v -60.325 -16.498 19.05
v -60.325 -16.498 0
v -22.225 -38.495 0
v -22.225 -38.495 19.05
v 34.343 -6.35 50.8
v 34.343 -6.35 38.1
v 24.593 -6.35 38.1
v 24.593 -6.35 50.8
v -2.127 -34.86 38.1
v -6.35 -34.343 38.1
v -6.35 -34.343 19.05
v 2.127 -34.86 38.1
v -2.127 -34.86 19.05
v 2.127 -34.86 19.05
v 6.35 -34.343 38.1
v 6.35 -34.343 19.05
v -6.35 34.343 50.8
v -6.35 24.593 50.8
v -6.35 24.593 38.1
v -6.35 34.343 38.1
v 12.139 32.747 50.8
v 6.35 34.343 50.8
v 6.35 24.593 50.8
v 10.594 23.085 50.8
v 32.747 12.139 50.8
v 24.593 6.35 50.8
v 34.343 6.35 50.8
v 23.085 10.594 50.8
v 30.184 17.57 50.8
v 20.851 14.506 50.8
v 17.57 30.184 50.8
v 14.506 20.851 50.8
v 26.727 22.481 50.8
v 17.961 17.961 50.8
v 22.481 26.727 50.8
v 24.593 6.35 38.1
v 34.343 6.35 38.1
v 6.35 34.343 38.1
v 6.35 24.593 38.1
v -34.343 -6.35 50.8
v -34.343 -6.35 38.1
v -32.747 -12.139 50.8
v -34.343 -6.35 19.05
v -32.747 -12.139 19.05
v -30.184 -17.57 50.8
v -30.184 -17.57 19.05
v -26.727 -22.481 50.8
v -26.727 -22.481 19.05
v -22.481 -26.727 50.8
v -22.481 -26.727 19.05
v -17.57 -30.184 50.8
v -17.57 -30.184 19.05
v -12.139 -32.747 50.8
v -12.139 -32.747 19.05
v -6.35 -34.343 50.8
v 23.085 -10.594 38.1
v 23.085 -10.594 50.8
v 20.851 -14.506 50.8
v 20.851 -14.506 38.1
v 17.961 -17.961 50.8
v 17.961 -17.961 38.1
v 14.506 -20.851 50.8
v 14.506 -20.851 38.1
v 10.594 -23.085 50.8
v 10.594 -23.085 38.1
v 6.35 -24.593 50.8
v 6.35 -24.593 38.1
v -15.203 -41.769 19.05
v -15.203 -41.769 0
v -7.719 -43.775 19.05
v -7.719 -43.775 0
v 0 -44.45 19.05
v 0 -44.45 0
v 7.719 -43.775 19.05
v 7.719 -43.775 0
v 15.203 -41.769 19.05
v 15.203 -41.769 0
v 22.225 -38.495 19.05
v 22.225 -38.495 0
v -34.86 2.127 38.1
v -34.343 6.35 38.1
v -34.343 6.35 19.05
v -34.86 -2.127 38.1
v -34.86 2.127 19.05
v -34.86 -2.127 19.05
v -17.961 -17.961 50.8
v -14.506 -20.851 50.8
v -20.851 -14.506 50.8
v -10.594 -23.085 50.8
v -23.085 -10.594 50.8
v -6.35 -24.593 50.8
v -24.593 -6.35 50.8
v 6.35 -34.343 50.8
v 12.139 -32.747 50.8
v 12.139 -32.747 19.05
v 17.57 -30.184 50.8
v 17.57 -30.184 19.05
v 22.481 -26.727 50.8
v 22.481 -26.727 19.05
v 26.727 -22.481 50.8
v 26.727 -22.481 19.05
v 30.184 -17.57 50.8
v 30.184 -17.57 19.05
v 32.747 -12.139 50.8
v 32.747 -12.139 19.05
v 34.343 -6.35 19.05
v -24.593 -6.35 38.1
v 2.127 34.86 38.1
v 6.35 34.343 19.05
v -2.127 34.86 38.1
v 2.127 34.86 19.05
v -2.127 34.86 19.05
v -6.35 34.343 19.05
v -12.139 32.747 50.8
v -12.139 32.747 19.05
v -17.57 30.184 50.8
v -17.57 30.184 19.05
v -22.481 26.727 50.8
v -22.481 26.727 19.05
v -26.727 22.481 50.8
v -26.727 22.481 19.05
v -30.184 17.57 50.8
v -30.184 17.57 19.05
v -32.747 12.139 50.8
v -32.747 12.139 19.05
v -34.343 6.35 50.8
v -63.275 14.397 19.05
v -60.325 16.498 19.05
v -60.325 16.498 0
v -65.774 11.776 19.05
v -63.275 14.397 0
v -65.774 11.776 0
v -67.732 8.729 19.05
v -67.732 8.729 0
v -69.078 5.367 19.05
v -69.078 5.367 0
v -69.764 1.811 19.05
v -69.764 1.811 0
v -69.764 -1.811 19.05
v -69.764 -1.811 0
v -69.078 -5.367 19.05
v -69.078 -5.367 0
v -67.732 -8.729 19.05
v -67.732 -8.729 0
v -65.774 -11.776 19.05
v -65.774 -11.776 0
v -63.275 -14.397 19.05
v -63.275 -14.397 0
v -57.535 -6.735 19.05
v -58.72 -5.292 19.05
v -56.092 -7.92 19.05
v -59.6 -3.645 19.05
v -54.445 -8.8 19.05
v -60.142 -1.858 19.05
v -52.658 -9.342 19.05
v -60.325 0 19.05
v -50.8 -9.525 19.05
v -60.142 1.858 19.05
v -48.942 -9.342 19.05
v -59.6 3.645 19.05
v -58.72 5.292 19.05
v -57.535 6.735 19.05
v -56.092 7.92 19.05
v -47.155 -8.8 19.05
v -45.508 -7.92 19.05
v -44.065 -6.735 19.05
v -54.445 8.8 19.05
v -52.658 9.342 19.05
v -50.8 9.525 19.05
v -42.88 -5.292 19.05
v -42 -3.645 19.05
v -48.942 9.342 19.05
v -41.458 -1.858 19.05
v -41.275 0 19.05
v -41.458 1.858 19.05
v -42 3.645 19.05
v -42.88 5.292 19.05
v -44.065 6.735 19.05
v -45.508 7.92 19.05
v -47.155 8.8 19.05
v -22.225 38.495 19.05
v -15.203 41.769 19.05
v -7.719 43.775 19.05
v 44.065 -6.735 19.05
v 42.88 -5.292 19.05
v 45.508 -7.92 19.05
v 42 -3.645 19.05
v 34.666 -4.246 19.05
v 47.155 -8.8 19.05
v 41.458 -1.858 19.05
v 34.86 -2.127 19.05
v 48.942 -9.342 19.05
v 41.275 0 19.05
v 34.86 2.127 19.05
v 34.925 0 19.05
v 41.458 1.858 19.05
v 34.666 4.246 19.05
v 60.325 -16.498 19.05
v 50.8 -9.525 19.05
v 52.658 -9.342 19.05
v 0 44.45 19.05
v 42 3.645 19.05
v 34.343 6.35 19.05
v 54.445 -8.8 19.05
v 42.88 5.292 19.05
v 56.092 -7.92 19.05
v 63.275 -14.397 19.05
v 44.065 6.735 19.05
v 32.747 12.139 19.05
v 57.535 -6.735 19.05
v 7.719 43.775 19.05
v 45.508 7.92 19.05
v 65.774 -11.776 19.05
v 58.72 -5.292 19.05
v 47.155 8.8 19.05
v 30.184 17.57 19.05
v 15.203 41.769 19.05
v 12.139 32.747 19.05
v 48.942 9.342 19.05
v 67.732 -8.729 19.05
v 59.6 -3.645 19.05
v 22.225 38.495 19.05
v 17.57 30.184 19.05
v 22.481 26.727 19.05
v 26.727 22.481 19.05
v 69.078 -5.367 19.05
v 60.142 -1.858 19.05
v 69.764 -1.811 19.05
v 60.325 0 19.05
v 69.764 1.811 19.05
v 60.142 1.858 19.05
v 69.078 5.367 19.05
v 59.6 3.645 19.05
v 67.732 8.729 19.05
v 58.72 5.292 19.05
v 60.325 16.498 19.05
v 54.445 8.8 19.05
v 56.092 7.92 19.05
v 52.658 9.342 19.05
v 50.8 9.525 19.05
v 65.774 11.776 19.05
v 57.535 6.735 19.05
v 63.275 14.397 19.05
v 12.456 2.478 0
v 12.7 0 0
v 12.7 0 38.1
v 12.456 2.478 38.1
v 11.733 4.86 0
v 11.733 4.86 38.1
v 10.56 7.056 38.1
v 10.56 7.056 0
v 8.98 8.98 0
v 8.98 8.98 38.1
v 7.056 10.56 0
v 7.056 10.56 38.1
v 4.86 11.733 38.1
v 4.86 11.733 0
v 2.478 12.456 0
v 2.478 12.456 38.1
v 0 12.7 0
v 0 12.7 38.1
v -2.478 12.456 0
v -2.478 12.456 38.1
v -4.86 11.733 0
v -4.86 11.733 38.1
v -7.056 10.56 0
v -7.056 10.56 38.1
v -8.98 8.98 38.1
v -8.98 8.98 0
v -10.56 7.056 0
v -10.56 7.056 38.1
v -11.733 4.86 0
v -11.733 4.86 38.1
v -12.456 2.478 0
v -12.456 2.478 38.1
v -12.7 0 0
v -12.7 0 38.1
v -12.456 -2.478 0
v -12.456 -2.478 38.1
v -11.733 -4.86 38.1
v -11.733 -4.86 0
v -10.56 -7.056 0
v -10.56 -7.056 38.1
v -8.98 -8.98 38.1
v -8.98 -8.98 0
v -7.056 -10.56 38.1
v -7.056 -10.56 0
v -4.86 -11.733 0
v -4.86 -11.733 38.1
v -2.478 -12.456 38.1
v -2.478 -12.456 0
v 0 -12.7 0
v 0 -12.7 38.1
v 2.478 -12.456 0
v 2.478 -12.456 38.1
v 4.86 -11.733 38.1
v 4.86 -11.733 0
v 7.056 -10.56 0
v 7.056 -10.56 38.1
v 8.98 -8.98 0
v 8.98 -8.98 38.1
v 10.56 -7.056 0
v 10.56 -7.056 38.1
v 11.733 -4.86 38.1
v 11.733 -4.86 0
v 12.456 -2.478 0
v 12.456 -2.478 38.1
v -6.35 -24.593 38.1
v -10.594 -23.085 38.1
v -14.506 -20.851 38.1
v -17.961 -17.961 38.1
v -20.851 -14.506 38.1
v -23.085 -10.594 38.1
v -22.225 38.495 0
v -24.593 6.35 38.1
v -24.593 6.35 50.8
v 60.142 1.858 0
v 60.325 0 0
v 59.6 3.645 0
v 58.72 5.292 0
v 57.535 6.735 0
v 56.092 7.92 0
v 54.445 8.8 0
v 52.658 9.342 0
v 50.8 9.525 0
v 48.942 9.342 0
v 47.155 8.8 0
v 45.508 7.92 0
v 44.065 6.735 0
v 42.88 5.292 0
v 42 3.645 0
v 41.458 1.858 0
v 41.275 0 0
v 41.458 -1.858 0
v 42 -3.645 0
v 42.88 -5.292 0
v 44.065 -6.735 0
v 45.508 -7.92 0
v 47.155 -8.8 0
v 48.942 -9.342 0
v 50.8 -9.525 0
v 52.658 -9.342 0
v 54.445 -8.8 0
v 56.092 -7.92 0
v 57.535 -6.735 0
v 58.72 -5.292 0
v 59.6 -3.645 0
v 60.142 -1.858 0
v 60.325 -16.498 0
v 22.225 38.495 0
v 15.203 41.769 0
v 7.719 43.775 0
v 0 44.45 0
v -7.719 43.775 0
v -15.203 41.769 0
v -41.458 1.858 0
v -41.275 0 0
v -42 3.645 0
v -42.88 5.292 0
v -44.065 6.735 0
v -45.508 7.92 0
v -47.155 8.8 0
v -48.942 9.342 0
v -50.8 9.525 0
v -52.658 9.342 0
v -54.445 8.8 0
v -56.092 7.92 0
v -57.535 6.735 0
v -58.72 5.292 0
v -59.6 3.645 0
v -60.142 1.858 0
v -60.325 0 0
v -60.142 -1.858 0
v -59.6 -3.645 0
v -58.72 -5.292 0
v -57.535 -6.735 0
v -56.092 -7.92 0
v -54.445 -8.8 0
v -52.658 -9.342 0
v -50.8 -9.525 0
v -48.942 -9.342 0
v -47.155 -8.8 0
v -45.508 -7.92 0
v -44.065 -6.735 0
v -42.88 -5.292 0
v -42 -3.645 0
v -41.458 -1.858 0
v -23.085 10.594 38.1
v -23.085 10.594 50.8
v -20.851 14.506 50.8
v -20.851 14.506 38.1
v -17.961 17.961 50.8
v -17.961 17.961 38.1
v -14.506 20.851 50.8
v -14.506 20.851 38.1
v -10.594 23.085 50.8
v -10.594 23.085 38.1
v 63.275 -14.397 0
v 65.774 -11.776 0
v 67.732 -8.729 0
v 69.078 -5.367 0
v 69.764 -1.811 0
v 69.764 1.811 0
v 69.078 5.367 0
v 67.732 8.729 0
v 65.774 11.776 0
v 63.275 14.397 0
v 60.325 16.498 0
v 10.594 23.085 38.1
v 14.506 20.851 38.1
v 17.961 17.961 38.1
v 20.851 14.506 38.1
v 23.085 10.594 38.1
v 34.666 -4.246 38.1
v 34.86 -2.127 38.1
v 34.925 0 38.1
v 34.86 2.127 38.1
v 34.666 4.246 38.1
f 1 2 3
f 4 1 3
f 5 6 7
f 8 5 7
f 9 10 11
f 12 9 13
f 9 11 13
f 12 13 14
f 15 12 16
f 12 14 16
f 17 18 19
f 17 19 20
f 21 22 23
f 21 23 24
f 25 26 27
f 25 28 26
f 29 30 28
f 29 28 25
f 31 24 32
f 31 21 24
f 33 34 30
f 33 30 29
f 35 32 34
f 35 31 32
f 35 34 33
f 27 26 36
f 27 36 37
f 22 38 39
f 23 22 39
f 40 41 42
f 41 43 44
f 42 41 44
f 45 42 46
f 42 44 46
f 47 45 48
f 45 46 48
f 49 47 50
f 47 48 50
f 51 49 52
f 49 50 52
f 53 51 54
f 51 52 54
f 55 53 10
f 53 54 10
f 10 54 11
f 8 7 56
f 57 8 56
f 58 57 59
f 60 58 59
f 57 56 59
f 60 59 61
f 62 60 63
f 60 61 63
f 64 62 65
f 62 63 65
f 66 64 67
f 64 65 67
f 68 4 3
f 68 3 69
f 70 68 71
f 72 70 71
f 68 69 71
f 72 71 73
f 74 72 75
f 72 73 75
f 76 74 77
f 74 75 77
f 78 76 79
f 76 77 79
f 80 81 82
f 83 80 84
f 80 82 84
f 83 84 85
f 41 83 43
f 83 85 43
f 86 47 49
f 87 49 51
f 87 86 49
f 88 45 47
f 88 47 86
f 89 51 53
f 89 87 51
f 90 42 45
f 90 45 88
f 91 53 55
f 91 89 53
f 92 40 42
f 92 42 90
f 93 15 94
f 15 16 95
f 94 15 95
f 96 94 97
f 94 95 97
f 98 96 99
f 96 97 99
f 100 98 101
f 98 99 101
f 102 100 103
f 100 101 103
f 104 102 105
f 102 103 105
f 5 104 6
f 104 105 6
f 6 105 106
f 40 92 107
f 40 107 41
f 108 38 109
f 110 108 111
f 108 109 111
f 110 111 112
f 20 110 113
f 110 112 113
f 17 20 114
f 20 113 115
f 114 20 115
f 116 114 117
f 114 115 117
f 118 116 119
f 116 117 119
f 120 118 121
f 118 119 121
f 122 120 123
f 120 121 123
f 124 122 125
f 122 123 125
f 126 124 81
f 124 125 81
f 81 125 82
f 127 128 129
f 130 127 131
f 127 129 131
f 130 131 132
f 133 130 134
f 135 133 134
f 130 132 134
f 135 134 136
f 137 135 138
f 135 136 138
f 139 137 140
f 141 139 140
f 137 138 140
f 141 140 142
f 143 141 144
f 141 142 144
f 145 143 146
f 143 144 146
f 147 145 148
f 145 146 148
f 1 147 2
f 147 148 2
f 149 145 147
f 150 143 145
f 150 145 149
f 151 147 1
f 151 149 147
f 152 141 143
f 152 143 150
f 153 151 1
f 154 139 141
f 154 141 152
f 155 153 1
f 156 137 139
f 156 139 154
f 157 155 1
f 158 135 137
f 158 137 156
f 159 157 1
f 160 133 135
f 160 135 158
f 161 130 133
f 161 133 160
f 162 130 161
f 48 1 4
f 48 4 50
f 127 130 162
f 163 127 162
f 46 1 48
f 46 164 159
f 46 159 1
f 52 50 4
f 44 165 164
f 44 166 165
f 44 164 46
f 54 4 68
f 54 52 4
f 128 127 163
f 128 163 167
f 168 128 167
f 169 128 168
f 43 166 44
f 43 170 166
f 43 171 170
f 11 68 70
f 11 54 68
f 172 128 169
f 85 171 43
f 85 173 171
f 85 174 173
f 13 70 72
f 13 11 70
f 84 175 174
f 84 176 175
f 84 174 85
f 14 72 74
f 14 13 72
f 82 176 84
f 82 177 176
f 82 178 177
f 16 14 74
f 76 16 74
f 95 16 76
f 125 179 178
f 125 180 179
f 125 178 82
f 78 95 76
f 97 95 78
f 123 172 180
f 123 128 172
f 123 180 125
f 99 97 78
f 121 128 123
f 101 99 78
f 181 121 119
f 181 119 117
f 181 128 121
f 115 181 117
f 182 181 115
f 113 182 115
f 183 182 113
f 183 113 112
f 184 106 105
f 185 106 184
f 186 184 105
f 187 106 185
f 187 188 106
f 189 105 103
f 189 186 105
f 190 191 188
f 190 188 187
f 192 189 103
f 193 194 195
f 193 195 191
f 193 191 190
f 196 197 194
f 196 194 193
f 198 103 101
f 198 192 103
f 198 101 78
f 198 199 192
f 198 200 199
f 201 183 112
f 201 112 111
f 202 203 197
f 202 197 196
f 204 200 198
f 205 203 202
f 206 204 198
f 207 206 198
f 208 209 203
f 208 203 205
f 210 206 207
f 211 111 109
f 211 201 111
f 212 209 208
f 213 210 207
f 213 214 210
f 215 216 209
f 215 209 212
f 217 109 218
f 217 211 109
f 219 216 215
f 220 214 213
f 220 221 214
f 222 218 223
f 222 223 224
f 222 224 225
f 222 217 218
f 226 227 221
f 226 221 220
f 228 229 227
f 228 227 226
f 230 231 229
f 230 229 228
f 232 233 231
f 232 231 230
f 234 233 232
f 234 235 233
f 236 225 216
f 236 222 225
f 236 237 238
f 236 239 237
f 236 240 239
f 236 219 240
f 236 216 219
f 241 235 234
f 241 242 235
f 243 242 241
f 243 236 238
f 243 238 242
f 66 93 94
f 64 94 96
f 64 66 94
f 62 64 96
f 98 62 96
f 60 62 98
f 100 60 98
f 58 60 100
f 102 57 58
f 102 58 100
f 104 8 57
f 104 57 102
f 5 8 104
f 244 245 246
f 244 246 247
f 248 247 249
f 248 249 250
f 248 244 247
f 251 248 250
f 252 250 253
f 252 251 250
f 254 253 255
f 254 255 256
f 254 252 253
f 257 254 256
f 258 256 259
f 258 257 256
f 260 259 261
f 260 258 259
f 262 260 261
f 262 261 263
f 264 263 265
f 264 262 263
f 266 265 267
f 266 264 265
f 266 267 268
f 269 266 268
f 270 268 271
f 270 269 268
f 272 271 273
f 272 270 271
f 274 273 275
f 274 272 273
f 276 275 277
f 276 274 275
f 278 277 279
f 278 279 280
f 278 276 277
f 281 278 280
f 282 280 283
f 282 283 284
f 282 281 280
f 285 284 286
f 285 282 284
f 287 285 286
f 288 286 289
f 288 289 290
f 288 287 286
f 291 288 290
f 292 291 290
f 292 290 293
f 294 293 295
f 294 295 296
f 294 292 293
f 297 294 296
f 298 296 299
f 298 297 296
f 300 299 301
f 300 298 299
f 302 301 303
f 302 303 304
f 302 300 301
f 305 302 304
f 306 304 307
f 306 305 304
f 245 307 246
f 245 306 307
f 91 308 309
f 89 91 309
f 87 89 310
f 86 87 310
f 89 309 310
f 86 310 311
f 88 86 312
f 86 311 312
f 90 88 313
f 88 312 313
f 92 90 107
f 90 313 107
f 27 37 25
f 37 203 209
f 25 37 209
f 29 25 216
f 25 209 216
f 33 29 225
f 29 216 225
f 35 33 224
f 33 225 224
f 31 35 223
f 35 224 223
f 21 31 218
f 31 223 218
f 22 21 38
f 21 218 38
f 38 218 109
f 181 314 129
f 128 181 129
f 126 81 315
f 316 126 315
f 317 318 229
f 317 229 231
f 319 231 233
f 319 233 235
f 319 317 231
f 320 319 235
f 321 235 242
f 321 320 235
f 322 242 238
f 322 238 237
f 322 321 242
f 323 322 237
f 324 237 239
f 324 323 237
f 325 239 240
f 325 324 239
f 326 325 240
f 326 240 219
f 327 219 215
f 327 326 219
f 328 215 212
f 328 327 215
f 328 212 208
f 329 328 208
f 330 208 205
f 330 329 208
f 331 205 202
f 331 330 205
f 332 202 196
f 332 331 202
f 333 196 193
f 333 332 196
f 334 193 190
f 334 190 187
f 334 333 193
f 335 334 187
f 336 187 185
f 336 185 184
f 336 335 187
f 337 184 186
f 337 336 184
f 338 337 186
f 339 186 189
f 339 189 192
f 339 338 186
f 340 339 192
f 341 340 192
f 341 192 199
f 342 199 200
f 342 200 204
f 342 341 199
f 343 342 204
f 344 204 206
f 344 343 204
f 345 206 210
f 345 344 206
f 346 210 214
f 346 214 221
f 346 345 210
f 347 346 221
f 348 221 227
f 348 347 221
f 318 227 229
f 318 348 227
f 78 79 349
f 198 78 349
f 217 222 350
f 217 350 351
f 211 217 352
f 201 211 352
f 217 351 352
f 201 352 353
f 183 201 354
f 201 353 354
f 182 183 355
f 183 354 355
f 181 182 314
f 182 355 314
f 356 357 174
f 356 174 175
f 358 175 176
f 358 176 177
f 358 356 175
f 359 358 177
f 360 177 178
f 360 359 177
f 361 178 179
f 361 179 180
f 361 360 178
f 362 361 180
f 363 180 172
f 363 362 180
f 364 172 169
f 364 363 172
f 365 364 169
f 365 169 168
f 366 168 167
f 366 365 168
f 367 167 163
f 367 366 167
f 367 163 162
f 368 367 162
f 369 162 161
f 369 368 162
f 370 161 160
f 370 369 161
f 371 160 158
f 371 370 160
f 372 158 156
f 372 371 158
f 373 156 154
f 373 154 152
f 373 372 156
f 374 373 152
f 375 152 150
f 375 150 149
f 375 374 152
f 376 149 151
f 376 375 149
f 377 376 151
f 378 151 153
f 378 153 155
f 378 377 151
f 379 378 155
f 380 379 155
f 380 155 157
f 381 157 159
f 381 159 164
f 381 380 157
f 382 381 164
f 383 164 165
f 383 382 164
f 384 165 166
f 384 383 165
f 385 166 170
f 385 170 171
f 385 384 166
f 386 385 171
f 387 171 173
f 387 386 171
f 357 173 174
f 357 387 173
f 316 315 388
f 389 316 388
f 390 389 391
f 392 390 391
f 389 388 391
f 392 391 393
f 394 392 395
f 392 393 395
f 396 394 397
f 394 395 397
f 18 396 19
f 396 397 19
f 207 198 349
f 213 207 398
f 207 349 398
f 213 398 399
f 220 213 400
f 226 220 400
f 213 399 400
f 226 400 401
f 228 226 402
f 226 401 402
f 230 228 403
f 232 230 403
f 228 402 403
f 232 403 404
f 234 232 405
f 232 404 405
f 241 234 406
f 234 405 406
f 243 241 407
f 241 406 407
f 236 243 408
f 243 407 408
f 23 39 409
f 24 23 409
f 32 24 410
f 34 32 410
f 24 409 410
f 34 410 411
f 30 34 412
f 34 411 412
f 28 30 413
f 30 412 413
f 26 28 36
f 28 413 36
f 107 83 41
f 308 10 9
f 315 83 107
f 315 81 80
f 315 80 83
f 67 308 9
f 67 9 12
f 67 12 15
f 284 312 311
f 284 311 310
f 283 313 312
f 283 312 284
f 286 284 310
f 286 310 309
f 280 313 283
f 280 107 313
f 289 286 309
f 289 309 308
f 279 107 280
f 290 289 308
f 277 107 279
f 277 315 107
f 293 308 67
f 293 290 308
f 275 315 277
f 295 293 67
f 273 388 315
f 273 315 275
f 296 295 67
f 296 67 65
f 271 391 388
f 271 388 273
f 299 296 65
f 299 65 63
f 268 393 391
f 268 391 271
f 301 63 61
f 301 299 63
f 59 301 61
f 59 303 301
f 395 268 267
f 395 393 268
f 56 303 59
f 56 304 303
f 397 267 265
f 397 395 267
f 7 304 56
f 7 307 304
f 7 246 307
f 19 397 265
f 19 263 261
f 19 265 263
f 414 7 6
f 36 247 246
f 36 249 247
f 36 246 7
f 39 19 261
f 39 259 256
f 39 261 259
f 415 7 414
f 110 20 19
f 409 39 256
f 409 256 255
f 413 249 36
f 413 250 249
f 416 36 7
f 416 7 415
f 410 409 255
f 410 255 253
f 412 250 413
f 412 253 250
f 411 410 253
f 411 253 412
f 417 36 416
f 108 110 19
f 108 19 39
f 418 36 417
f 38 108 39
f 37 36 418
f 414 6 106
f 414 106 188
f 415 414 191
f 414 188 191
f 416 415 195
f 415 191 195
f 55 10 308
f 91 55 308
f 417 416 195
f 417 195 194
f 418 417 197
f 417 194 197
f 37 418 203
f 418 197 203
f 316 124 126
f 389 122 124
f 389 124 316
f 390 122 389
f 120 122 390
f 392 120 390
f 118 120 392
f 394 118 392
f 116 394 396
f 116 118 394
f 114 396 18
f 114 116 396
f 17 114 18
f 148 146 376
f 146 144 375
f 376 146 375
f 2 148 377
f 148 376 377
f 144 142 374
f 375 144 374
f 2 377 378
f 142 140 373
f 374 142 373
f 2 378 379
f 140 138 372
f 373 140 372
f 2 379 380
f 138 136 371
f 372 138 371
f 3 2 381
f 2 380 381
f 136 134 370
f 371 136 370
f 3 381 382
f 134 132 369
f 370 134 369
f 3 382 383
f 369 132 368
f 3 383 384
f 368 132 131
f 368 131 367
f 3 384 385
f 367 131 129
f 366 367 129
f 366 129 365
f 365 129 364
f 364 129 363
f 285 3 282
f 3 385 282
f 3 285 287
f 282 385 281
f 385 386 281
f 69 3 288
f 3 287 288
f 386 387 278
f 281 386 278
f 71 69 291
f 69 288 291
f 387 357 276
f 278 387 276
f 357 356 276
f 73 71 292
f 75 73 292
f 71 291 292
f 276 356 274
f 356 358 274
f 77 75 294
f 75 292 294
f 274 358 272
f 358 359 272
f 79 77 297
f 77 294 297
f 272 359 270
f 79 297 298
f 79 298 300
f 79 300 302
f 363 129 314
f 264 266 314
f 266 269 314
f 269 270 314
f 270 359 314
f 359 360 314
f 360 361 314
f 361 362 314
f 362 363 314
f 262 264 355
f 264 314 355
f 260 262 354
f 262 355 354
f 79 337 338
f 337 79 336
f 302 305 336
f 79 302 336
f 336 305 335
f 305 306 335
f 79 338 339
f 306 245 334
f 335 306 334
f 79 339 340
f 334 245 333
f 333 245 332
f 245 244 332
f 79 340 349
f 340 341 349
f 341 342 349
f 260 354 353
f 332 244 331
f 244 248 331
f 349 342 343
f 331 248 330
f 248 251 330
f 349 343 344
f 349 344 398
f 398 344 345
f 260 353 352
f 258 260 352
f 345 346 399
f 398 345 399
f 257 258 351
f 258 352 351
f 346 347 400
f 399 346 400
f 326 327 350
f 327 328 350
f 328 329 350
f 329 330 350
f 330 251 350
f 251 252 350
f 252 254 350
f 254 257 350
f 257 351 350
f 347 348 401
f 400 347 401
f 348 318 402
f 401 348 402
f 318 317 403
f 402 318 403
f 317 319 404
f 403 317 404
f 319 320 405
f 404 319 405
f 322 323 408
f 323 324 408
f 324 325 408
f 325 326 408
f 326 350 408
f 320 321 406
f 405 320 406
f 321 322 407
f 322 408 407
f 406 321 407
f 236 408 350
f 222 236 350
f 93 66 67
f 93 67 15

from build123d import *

# Parameters (mm, degrees)
F0_R     = 9.525
F1_DEPTH = 19.05
F0_R_2   = 12.7
F2_DEPTH = 38.1
F3_DEPTH = 50.8


with BuildPart() as f1:
    # F0 (on Top) → F1 (new body)
    with BuildSketch(Plane.XY):
        with BuildLine():
            Line((-60.325, -16.497784), (-22.225, -38.494829))
            ThreePointArc((-22.225, -38.494829), (0, -44.45), (22.225, -38.494829))
            Line((22.225, -38.494829), (60.325, -16.497784))
            ThreePointArc((60.325, -16.497784), (69.85, 0), (60.325, 16.497784))
            Line((60.325, 16.497784), (22.225, 38.494829))
            ThreePointArc((22.225, 38.494829), (0, 44.45), (-22.225, 38.494829))
            Line((-22.225, 38.494829), (-60.325, 16.497784))
            ThreePointArc((-60.325, 16.497784), (-69.85, 0), (-60.325, -16.497784))
        make_face()
        with Locations((-50.8, 0)):
            Circle(F0_R, mode=Mode.SUBTRACT)
        with BuildLine():
            ThreePointArc((34.342876, 6.35), (34.779164, 3.188313), (34.925, 0))
            ThreePointArc((34.925, 0), (34.779164, -3.188313), (34.342876, -6.35))
            ThreePointArc((34.342876, -6.35), (24.695704, -24.695704), (6.35, -34.342876))
            ThreePointArc((6.35, -34.342876), (0, -34.925), (-6.35, -34.342876))
            ThreePointArc((-6.35, -34.342876), (-24.695704, -24.695704), (-34.342876, -6.35))
            ThreePointArc((-34.342876, -6.35), (-34.925, 0), (-34.342876, 6.35))
            ThreePointArc((-34.342876, 6.35), (-24.695704, 24.695704), (-6.35, 34.342876))
            ThreePointArc((-6.35, 34.342876), (0, 34.925), (6.35, 34.342876))
            ThreePointArc((6.35, 34.342876), (24.695704, 24.695704), (34.342876, 6.35))
        make_face(mode=Mode.SUBTRACT)
        with Locations((50.8, 0)):
            Circle(F0_R, mode=Mode.SUBTRACT)
    extrude(amount=F1_DEPTH)

    # F0 (on Top) → F2 (join)
    with BuildSketch(Plane.XY):
        with BuildLine():
            ThreePointArc((25.4, 0), (25.197554, 3.200509), (24.593444, 6.35))
            ThreePointArc((24.593444, 6.35), (17.960512, 17.960512), (6.35, 24.593444))
            ThreePointArc((6.35, 24.593444), (0, 25.4), (-6.35, 24.593444))
            ThreePointArc((-6.35, 24.593444), (-17.960512, 17.960512), (-24.593444, 6.35))
            ThreePointArc((-24.593444, 6.35), (-25.4, 0), (-24.593444, -6.35))
            ThreePointArc((-24.593444, -6.35), (-17.960512, -17.960512), (-6.35, -24.593444))
            ThreePointArc((-6.35, -24.593444), (0, -25.4), (6.35, -24.593444))
            ThreePointArc((6.35, -24.593444), (17.960512, -17.960512), (24.593444, -6.35))
            ThreePointArc((24.593444, -6.35), (25.197554, -3.200509), (25.4, 0))
        make_face()
        Circle(F0_R_2, mode=Mode.SUBTRACT)
        with BuildLine():
            Line((-24.593444, 6.35), (-34.342876, 6.35))
            ThreePointArc((-34.342876, 6.35), (-34.925, 0), (-34.342876, -6.35))
            Line((-34.342876, -6.35), (-24.593444, -6.35))
            ThreePointArc((-24.593444, -6.35), (-25.4, 0), (-24.593444, 6.35))
        make_face()
        with BuildLine():
            Line((6.35, 24.593444), (6.35, 34.342876))
            ThreePointArc((6.35, 34.342876), (0, 34.925), (-6.35, 34.342876))
            Line((-6.35, 34.342876), (-6.35, 24.593444))
            ThreePointArc((-6.35, 24.593444), (0, 25.4), (6.35, 24.593444))
        make_face()
        with BuildLine():
            ThreePointArc((-6.35, -34.342876), (0, -34.925), (6.35, -34.342876))
            Line((6.35, -34.342876), (6.35, -24.593444))
            ThreePointArc((6.35, -24.593444), (0, -25.4), (-6.35, -24.593444))
            Line((-6.35, -24.593444), (-6.35, -34.342876))
        make_face()
        with BuildLine():
            ThreePointArc((34.342876, -6.35), (34.779164, -3.188313), (34.925, 0))
            ThreePointArc((34.925, 0), (34.779164, 3.188313), (34.342876, 6.35))
            Line((34.342876, 6.35), (24.593444, 6.35))
            ThreePointArc((24.593444, 6.35), (25.197554, 3.200509), (25.4, 0))
            ThreePointArc((25.4, 0), (25.197554, -3.200509), (24.593444, -6.35))
            Line((24.593444, -6.35), (34.342876, -6.35))
        make_face()
    extrude(amount=F2_DEPTH)

    # F0 (on Top) → F3 (join)
    with BuildSketch(Plane.XY):
        with BuildLine():
            Line((24.593444, 6.35), (34.342876, 6.35))
            ThreePointArc((34.342876, 6.35), (24.695704, 24.695704), (6.35, 34.342876))
            Line((6.35, 34.342876), (6.35, 24.593444))
            ThreePointArc((6.35, 24.593444), (17.960512, 17.960512), (24.593444, 6.35))
        make_face()
        with BuildLine():
            ThreePointArc((6.35, -34.342876), (24.695704, -24.695704), (34.342876, -6.35))
            Line((34.342876, -6.35), (24.593444, -6.35))
            ThreePointArc((24.593444, -6.35), (17.960512, -17.960512), (6.35, -24.593444))
            Line((6.35, -24.593444), (6.35, -34.342876))
        make_face()
        with BuildLine():
            ThreePointArc((-34.342876, -6.35), (-24.695704, -24.695704), (-6.35, -34.342876))
            Line((-6.35, -34.342876), (-6.35, -24.593444))
            ThreePointArc((-6.35, -24.593444), (-17.960512, -17.960512), (-24.593444, -6.35))
            Line((-24.593444, -6.35), (-34.342876, -6.35))
        make_face()
        with BuildLine():
            Line((-6.35, 24.593444), (-6.35, 34.342876))
            ThreePointArc((-6.35, 34.342876), (-24.695704, 24.695704), (-34.342876, 6.35))
            Line((-34.342876, 6.35), (-24.593444, 6.35))
            ThreePointArc((-24.593444, 6.35), (-17.960512, 17.960512), (-6.35, 24.593444))
        make_face()
    extrude(amount=F3_DEPTH)


solid = f1.part
